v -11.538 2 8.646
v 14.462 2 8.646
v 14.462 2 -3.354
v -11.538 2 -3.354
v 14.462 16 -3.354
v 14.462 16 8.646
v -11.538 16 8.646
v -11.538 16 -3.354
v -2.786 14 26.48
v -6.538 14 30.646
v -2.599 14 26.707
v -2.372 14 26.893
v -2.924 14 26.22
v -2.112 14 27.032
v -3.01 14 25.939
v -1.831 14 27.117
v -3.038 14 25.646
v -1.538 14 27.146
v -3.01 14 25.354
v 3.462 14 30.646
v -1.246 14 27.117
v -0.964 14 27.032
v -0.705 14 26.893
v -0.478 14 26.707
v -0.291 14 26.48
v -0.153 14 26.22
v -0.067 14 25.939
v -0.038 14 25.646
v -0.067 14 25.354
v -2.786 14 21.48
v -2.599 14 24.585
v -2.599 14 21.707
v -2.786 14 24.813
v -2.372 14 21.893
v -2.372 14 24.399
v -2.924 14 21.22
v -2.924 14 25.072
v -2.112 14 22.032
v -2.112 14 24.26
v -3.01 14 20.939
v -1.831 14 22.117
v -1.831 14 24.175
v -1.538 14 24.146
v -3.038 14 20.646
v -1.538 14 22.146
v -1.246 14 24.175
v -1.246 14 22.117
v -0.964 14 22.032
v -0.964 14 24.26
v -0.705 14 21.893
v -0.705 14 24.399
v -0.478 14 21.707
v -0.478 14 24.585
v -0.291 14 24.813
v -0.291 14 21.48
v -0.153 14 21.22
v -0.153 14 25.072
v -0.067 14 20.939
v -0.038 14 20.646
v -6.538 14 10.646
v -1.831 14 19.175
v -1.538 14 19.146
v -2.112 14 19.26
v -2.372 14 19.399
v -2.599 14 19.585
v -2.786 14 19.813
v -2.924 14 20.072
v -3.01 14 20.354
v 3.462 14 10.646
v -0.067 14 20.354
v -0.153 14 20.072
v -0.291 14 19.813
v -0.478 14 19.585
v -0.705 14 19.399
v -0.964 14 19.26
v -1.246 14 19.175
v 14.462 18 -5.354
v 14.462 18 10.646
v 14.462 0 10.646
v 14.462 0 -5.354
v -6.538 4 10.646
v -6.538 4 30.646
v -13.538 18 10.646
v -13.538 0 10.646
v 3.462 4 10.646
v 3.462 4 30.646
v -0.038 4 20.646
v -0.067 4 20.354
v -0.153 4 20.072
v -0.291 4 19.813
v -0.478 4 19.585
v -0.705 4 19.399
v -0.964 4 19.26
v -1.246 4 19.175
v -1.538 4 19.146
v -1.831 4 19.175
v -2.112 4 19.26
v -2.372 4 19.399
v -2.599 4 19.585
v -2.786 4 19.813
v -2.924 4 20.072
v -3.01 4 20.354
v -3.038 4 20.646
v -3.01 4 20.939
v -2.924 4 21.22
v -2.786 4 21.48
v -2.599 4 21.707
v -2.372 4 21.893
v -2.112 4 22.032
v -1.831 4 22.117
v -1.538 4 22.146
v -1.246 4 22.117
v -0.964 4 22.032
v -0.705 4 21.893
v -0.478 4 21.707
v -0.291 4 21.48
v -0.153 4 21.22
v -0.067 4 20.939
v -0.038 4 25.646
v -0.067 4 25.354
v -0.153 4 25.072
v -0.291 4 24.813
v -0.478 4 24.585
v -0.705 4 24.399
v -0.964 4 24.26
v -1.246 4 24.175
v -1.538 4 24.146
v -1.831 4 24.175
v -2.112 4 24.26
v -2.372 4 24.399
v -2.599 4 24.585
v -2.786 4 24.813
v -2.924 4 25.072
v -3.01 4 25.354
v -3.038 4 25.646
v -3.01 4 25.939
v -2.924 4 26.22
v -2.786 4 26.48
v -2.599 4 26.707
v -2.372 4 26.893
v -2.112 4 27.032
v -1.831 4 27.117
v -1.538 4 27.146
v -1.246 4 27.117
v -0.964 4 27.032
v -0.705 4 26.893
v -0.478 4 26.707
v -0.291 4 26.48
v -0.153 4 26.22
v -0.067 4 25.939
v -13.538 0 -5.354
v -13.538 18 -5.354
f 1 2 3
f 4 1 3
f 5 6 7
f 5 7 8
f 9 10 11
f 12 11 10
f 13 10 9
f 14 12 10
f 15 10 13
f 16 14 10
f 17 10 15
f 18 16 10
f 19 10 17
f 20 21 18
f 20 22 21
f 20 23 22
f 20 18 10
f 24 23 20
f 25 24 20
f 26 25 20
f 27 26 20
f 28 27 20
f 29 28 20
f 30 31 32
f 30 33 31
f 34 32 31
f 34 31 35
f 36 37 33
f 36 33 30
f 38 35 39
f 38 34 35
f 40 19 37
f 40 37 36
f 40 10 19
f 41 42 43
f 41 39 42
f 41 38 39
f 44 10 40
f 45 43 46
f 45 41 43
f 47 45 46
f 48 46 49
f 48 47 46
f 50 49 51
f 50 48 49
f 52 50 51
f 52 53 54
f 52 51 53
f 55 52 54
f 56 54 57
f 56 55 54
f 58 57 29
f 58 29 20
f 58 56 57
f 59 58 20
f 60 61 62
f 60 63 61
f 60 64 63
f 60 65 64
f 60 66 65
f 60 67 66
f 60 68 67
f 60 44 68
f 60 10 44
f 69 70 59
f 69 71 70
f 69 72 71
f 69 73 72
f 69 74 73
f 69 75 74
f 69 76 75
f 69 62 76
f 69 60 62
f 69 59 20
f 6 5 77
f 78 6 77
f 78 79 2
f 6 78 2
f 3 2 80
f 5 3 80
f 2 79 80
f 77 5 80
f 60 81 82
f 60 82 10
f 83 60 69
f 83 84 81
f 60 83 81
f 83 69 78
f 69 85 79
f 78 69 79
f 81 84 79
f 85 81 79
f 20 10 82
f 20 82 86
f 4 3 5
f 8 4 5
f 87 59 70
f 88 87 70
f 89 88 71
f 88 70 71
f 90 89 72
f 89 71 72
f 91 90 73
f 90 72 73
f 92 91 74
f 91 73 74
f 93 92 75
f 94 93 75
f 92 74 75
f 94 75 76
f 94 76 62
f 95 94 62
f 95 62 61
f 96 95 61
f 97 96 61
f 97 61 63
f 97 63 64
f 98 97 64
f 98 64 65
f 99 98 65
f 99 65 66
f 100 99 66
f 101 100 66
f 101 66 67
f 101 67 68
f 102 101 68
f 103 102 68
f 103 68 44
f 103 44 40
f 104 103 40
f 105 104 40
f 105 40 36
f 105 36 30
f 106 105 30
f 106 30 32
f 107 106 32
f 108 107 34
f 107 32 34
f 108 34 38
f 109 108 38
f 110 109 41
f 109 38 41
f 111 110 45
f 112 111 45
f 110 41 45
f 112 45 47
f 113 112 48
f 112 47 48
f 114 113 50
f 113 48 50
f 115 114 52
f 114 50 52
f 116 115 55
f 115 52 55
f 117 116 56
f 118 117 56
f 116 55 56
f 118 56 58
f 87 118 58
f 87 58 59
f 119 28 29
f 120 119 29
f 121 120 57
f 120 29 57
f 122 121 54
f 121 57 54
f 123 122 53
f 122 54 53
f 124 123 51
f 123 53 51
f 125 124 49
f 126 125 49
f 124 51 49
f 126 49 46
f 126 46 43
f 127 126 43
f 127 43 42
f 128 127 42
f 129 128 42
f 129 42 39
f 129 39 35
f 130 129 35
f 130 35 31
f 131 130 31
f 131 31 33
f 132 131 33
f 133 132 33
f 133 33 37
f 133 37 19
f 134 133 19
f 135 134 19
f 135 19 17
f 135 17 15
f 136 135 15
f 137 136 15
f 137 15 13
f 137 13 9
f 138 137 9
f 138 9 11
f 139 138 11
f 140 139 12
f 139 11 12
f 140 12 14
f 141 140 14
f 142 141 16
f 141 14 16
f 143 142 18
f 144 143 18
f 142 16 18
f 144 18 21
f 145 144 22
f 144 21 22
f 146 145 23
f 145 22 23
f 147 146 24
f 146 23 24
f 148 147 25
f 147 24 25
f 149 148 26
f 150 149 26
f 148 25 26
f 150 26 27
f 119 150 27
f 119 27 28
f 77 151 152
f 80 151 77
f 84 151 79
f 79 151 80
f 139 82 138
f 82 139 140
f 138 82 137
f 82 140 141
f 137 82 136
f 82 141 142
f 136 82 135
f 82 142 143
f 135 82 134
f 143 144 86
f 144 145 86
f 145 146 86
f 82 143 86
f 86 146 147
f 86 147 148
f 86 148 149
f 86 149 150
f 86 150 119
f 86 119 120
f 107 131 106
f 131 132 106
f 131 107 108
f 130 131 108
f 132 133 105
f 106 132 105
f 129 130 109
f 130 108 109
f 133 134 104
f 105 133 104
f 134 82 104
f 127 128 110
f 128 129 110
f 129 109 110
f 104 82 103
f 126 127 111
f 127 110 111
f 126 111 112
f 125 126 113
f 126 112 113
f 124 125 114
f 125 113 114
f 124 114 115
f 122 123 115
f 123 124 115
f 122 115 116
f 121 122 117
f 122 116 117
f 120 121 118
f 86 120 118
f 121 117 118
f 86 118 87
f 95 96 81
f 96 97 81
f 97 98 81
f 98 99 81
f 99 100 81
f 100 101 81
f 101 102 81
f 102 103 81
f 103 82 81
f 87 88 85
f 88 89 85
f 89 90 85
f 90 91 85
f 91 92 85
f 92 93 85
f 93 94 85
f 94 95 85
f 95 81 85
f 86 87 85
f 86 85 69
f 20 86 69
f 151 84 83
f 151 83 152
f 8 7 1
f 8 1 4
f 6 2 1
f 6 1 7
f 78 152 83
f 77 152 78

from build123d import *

# Parameters (mm, degrees)
SKETCH1_W           = 28
SKETCH1_H           = 16
BOSS_EXTRUDE1_DEPTH = 18
SKETCH3_W           = 10
SKETCH3_H           = 10
BOSS_EXTRUDE2_DEPTH = 20
SKETCH4_W           = 12
SKETCH4_H           = 14
CUT_EXTRUDE1_DEPTH  = 25
SKETCH5_R           = 1.5
CUT_EXTRUDE2_DEPTH  = 25
SKETCH4_2_W         = 12
SKETCH4_2_H         = 14
CUT_EXTRUDE3_DEPTH  = 26


with BuildPart() as part:
    # Sketch1 → Boss-Extrude1 (new body)
    with BuildSketch(Plane(origin=(0, 0, 0), x_dir=(1, 0, 0), z_dir=(0, 1, 0))):
        with Locations((0.461538462, -2.646153846)):
            Rectangle(SKETCH1_W, SKETCH1_H)
    extrude(amount=BOSS_EXTRUDE1_DEPTH)

    # Sketch3 → Boss-Extrude2 (add)
    with BuildSketch(Plane.XY.offset(10.646153846)):
        with Locations((-1.538461538, 9)):
            Rectangle(SKETCH3_W, SKETCH3_H)
    extrude(amount=BOSS_EXTRUDE2_DEPTH)

    # Sketch4 → Cut-Extrude1 (cut)
    with BuildSketch(Plane(origin=(14.461538462, 0, 0), x_dir=(0, 0, -1), z_dir=(1, 0, 0))):
        with Locations((-2.646153846, 9)):
            Rectangle(SKETCH4_W, SKETCH4_H)
    extrude(amount=-CUT_EXTRUDE1_DEPTH, mode=Mode.SUBTRACT)

    # Sketch5 → Cut-Extrude2 (cut)
    with BuildSketch(Plane(origin=(0, 14, 0), x_dir=(1, 0, 0), z_dir=(0, 1, 0))):
        with Locations((-1.538461538, -20.646153846)):
            Circle(SKETCH5_R)
        with Locations((-1.538461538, -25.646153846)):
            Circle(SKETCH5_R)
    extrude(amount=-CUT_EXTRUDE2_DEPTH, mode=Mode.SUBTRACT)

    # Sketch4<2> → Cut-Extrude3 (cut)
    with BuildSketch(Plane(origin=(14.461538462, 0, 0), x_dir=(0, 0, -1), z_dir=(1, 0, 0))):
        with Locations((-2.646153846, 9)):
            Rectangle(SKETCH4_2_W, SKETCH4_2_H)
    extrude(amount=-CUT_EXTRUDE3_DEPTH, mode=Mode.SUBTRACT)


solid = part.part
